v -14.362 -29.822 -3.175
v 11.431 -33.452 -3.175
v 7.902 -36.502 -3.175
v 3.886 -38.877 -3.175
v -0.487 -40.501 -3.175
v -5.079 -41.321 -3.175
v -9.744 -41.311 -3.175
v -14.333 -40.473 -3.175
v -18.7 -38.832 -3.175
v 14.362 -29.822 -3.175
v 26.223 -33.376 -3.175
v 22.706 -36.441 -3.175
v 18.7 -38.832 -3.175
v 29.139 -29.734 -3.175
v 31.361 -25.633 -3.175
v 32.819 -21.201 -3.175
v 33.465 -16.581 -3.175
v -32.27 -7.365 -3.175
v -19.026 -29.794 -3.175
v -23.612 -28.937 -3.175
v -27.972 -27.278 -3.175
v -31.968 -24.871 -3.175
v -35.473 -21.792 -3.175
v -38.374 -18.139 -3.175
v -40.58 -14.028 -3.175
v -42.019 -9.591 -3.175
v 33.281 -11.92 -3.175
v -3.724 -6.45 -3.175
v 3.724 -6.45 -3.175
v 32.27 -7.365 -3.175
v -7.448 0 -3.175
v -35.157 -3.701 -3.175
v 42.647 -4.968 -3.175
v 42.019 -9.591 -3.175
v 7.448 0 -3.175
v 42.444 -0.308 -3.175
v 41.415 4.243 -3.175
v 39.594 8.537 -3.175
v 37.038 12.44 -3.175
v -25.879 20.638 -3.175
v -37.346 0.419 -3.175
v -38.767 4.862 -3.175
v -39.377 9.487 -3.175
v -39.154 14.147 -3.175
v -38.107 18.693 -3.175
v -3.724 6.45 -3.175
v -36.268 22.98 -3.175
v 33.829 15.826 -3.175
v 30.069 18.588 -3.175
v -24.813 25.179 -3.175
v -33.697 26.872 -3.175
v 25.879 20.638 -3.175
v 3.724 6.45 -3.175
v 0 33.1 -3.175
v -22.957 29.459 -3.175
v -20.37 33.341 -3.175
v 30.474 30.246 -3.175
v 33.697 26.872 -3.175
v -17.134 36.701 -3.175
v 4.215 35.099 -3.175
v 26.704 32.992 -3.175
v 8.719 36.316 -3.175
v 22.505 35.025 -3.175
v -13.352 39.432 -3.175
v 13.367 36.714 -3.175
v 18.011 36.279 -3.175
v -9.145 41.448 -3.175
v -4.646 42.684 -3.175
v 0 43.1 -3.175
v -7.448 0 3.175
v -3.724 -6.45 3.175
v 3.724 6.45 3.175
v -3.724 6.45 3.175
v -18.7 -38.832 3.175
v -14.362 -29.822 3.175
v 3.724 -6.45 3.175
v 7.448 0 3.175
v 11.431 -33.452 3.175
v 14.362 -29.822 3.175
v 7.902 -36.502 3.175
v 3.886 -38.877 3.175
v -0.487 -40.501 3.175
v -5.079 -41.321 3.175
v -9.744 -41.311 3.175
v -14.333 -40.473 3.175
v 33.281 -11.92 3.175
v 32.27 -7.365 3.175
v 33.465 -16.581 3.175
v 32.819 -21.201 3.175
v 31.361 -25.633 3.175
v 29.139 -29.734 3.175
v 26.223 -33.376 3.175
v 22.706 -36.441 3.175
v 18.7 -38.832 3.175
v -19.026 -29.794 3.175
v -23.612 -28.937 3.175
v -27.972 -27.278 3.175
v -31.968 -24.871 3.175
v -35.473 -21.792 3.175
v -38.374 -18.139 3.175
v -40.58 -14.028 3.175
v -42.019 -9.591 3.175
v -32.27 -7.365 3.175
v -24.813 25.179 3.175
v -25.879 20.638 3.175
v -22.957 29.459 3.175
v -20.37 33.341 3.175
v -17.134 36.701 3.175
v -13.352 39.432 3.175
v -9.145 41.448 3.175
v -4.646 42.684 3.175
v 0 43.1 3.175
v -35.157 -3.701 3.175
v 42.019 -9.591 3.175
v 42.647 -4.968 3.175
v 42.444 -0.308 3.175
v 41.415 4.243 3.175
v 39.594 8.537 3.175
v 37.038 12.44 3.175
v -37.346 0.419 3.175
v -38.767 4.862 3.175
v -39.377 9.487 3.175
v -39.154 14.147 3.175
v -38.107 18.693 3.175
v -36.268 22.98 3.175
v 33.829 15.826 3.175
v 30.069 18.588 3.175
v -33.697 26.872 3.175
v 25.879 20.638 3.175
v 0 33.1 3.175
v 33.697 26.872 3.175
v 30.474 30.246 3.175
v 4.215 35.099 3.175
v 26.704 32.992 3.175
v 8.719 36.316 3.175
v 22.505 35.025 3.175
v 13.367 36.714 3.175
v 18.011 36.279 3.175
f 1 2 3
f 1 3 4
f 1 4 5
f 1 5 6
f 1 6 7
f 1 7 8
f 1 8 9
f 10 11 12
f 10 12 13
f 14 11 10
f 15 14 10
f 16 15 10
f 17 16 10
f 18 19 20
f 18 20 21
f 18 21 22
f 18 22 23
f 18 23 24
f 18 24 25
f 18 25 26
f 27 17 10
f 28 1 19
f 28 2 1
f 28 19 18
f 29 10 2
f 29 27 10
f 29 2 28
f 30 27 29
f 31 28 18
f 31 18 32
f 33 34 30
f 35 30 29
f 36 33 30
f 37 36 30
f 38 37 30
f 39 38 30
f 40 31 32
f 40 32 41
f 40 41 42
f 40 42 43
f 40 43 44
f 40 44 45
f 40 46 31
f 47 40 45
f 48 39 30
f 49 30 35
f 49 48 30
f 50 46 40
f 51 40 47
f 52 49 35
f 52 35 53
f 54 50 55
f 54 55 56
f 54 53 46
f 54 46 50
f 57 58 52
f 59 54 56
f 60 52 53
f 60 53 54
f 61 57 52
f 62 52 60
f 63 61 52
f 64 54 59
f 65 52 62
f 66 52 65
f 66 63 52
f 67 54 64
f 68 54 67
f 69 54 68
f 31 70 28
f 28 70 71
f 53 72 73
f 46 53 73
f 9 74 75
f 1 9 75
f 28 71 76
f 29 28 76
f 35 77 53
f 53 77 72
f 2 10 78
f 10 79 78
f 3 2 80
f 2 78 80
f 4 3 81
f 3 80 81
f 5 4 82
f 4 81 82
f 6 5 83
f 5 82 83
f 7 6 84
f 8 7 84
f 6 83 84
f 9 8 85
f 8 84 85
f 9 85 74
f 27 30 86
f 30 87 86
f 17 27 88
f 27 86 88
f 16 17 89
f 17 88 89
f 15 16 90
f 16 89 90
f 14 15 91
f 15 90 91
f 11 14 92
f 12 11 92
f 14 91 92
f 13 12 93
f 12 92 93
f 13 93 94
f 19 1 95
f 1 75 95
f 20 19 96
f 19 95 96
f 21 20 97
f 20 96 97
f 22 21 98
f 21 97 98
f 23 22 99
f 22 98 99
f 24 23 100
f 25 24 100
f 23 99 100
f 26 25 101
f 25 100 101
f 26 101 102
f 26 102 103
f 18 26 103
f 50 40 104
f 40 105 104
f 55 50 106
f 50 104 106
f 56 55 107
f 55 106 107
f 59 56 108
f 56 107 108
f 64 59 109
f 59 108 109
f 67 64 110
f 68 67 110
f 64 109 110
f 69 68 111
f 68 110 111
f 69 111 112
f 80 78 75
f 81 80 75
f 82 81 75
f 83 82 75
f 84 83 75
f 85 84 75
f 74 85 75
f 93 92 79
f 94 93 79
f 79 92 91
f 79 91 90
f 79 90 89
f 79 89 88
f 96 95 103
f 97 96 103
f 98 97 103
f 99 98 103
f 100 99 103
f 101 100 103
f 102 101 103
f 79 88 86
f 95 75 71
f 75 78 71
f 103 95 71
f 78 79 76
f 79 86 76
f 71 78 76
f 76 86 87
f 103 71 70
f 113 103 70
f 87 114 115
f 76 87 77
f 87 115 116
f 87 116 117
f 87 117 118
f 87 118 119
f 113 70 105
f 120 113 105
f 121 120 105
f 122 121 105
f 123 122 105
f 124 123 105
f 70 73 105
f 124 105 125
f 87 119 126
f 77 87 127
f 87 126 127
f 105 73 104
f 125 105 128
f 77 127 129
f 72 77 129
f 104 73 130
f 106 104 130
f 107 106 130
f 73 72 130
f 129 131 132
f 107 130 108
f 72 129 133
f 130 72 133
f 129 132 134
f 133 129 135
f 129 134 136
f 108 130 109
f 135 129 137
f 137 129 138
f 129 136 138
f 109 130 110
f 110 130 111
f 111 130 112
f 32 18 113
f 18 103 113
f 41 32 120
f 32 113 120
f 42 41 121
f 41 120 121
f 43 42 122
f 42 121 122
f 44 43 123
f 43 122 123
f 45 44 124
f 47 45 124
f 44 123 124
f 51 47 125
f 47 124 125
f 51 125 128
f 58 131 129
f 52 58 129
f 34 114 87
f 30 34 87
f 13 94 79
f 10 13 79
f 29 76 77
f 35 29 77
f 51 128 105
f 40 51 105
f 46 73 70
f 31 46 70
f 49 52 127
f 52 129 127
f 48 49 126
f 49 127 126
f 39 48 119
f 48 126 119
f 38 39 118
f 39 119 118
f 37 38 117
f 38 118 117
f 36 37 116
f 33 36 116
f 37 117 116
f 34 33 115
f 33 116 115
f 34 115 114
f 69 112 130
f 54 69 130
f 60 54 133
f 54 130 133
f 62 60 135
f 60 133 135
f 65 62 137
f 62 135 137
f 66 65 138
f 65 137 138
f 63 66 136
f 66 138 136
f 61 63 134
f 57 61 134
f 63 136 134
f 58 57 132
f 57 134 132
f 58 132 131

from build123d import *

# Parameters (mm, degrees)
BOSS_EXTRUDE1_DEPTH = 3.175
CIRPATTERN1_COUNT   = 7
CUT_EXTRUDE1_DEPTH  = 61.984142822


with BuildPart() as part:
    # Sketch1 → Boss-Extrude1 (new, symmetric)
    with BuildSketch(Plane.XY):
        with BuildLine():
            Line((0, 0), (0, 33.1))
            ThreePointArc((0, 33.1), (18.011361269, 36.278515567), (33.696936894, 26.87241046))
            Line((33.696936894, 26.87241046), (0, 0))
        make_face()
    boss_extrude1 = extrude(amount=BOSS_EXTRUDE1_DEPTH, both=True)

    # CirPattern1: Boss-Extrude1 ×7 about axis
    cirpattern1_axis = Axis((0, 0, 0), (0, 0, 1))
    for i in range(1, CIRPATTERN1_COUNT):
        add(boss_extrude1.rotate(cirpattern1_axis, i * 360 / CIRPATTERN1_COUNT))

    # Sketch2 → Cut-Extrude1 (cut, through all)
    with BuildSketch(Plane.XY.offset(3.175)):
        Polygon((7.447818473, 0), (3.723909236, 6.45), (-3.723909236, 6.45), (-7.447818473, 0), (-3.723909236, -6.45), (3.723909236, -6.45), align=None)
    extrude(amount=-CUT_EXTRUDE1_DEPTH, mode=Mode.SUBTRACT)


solid = part.part
